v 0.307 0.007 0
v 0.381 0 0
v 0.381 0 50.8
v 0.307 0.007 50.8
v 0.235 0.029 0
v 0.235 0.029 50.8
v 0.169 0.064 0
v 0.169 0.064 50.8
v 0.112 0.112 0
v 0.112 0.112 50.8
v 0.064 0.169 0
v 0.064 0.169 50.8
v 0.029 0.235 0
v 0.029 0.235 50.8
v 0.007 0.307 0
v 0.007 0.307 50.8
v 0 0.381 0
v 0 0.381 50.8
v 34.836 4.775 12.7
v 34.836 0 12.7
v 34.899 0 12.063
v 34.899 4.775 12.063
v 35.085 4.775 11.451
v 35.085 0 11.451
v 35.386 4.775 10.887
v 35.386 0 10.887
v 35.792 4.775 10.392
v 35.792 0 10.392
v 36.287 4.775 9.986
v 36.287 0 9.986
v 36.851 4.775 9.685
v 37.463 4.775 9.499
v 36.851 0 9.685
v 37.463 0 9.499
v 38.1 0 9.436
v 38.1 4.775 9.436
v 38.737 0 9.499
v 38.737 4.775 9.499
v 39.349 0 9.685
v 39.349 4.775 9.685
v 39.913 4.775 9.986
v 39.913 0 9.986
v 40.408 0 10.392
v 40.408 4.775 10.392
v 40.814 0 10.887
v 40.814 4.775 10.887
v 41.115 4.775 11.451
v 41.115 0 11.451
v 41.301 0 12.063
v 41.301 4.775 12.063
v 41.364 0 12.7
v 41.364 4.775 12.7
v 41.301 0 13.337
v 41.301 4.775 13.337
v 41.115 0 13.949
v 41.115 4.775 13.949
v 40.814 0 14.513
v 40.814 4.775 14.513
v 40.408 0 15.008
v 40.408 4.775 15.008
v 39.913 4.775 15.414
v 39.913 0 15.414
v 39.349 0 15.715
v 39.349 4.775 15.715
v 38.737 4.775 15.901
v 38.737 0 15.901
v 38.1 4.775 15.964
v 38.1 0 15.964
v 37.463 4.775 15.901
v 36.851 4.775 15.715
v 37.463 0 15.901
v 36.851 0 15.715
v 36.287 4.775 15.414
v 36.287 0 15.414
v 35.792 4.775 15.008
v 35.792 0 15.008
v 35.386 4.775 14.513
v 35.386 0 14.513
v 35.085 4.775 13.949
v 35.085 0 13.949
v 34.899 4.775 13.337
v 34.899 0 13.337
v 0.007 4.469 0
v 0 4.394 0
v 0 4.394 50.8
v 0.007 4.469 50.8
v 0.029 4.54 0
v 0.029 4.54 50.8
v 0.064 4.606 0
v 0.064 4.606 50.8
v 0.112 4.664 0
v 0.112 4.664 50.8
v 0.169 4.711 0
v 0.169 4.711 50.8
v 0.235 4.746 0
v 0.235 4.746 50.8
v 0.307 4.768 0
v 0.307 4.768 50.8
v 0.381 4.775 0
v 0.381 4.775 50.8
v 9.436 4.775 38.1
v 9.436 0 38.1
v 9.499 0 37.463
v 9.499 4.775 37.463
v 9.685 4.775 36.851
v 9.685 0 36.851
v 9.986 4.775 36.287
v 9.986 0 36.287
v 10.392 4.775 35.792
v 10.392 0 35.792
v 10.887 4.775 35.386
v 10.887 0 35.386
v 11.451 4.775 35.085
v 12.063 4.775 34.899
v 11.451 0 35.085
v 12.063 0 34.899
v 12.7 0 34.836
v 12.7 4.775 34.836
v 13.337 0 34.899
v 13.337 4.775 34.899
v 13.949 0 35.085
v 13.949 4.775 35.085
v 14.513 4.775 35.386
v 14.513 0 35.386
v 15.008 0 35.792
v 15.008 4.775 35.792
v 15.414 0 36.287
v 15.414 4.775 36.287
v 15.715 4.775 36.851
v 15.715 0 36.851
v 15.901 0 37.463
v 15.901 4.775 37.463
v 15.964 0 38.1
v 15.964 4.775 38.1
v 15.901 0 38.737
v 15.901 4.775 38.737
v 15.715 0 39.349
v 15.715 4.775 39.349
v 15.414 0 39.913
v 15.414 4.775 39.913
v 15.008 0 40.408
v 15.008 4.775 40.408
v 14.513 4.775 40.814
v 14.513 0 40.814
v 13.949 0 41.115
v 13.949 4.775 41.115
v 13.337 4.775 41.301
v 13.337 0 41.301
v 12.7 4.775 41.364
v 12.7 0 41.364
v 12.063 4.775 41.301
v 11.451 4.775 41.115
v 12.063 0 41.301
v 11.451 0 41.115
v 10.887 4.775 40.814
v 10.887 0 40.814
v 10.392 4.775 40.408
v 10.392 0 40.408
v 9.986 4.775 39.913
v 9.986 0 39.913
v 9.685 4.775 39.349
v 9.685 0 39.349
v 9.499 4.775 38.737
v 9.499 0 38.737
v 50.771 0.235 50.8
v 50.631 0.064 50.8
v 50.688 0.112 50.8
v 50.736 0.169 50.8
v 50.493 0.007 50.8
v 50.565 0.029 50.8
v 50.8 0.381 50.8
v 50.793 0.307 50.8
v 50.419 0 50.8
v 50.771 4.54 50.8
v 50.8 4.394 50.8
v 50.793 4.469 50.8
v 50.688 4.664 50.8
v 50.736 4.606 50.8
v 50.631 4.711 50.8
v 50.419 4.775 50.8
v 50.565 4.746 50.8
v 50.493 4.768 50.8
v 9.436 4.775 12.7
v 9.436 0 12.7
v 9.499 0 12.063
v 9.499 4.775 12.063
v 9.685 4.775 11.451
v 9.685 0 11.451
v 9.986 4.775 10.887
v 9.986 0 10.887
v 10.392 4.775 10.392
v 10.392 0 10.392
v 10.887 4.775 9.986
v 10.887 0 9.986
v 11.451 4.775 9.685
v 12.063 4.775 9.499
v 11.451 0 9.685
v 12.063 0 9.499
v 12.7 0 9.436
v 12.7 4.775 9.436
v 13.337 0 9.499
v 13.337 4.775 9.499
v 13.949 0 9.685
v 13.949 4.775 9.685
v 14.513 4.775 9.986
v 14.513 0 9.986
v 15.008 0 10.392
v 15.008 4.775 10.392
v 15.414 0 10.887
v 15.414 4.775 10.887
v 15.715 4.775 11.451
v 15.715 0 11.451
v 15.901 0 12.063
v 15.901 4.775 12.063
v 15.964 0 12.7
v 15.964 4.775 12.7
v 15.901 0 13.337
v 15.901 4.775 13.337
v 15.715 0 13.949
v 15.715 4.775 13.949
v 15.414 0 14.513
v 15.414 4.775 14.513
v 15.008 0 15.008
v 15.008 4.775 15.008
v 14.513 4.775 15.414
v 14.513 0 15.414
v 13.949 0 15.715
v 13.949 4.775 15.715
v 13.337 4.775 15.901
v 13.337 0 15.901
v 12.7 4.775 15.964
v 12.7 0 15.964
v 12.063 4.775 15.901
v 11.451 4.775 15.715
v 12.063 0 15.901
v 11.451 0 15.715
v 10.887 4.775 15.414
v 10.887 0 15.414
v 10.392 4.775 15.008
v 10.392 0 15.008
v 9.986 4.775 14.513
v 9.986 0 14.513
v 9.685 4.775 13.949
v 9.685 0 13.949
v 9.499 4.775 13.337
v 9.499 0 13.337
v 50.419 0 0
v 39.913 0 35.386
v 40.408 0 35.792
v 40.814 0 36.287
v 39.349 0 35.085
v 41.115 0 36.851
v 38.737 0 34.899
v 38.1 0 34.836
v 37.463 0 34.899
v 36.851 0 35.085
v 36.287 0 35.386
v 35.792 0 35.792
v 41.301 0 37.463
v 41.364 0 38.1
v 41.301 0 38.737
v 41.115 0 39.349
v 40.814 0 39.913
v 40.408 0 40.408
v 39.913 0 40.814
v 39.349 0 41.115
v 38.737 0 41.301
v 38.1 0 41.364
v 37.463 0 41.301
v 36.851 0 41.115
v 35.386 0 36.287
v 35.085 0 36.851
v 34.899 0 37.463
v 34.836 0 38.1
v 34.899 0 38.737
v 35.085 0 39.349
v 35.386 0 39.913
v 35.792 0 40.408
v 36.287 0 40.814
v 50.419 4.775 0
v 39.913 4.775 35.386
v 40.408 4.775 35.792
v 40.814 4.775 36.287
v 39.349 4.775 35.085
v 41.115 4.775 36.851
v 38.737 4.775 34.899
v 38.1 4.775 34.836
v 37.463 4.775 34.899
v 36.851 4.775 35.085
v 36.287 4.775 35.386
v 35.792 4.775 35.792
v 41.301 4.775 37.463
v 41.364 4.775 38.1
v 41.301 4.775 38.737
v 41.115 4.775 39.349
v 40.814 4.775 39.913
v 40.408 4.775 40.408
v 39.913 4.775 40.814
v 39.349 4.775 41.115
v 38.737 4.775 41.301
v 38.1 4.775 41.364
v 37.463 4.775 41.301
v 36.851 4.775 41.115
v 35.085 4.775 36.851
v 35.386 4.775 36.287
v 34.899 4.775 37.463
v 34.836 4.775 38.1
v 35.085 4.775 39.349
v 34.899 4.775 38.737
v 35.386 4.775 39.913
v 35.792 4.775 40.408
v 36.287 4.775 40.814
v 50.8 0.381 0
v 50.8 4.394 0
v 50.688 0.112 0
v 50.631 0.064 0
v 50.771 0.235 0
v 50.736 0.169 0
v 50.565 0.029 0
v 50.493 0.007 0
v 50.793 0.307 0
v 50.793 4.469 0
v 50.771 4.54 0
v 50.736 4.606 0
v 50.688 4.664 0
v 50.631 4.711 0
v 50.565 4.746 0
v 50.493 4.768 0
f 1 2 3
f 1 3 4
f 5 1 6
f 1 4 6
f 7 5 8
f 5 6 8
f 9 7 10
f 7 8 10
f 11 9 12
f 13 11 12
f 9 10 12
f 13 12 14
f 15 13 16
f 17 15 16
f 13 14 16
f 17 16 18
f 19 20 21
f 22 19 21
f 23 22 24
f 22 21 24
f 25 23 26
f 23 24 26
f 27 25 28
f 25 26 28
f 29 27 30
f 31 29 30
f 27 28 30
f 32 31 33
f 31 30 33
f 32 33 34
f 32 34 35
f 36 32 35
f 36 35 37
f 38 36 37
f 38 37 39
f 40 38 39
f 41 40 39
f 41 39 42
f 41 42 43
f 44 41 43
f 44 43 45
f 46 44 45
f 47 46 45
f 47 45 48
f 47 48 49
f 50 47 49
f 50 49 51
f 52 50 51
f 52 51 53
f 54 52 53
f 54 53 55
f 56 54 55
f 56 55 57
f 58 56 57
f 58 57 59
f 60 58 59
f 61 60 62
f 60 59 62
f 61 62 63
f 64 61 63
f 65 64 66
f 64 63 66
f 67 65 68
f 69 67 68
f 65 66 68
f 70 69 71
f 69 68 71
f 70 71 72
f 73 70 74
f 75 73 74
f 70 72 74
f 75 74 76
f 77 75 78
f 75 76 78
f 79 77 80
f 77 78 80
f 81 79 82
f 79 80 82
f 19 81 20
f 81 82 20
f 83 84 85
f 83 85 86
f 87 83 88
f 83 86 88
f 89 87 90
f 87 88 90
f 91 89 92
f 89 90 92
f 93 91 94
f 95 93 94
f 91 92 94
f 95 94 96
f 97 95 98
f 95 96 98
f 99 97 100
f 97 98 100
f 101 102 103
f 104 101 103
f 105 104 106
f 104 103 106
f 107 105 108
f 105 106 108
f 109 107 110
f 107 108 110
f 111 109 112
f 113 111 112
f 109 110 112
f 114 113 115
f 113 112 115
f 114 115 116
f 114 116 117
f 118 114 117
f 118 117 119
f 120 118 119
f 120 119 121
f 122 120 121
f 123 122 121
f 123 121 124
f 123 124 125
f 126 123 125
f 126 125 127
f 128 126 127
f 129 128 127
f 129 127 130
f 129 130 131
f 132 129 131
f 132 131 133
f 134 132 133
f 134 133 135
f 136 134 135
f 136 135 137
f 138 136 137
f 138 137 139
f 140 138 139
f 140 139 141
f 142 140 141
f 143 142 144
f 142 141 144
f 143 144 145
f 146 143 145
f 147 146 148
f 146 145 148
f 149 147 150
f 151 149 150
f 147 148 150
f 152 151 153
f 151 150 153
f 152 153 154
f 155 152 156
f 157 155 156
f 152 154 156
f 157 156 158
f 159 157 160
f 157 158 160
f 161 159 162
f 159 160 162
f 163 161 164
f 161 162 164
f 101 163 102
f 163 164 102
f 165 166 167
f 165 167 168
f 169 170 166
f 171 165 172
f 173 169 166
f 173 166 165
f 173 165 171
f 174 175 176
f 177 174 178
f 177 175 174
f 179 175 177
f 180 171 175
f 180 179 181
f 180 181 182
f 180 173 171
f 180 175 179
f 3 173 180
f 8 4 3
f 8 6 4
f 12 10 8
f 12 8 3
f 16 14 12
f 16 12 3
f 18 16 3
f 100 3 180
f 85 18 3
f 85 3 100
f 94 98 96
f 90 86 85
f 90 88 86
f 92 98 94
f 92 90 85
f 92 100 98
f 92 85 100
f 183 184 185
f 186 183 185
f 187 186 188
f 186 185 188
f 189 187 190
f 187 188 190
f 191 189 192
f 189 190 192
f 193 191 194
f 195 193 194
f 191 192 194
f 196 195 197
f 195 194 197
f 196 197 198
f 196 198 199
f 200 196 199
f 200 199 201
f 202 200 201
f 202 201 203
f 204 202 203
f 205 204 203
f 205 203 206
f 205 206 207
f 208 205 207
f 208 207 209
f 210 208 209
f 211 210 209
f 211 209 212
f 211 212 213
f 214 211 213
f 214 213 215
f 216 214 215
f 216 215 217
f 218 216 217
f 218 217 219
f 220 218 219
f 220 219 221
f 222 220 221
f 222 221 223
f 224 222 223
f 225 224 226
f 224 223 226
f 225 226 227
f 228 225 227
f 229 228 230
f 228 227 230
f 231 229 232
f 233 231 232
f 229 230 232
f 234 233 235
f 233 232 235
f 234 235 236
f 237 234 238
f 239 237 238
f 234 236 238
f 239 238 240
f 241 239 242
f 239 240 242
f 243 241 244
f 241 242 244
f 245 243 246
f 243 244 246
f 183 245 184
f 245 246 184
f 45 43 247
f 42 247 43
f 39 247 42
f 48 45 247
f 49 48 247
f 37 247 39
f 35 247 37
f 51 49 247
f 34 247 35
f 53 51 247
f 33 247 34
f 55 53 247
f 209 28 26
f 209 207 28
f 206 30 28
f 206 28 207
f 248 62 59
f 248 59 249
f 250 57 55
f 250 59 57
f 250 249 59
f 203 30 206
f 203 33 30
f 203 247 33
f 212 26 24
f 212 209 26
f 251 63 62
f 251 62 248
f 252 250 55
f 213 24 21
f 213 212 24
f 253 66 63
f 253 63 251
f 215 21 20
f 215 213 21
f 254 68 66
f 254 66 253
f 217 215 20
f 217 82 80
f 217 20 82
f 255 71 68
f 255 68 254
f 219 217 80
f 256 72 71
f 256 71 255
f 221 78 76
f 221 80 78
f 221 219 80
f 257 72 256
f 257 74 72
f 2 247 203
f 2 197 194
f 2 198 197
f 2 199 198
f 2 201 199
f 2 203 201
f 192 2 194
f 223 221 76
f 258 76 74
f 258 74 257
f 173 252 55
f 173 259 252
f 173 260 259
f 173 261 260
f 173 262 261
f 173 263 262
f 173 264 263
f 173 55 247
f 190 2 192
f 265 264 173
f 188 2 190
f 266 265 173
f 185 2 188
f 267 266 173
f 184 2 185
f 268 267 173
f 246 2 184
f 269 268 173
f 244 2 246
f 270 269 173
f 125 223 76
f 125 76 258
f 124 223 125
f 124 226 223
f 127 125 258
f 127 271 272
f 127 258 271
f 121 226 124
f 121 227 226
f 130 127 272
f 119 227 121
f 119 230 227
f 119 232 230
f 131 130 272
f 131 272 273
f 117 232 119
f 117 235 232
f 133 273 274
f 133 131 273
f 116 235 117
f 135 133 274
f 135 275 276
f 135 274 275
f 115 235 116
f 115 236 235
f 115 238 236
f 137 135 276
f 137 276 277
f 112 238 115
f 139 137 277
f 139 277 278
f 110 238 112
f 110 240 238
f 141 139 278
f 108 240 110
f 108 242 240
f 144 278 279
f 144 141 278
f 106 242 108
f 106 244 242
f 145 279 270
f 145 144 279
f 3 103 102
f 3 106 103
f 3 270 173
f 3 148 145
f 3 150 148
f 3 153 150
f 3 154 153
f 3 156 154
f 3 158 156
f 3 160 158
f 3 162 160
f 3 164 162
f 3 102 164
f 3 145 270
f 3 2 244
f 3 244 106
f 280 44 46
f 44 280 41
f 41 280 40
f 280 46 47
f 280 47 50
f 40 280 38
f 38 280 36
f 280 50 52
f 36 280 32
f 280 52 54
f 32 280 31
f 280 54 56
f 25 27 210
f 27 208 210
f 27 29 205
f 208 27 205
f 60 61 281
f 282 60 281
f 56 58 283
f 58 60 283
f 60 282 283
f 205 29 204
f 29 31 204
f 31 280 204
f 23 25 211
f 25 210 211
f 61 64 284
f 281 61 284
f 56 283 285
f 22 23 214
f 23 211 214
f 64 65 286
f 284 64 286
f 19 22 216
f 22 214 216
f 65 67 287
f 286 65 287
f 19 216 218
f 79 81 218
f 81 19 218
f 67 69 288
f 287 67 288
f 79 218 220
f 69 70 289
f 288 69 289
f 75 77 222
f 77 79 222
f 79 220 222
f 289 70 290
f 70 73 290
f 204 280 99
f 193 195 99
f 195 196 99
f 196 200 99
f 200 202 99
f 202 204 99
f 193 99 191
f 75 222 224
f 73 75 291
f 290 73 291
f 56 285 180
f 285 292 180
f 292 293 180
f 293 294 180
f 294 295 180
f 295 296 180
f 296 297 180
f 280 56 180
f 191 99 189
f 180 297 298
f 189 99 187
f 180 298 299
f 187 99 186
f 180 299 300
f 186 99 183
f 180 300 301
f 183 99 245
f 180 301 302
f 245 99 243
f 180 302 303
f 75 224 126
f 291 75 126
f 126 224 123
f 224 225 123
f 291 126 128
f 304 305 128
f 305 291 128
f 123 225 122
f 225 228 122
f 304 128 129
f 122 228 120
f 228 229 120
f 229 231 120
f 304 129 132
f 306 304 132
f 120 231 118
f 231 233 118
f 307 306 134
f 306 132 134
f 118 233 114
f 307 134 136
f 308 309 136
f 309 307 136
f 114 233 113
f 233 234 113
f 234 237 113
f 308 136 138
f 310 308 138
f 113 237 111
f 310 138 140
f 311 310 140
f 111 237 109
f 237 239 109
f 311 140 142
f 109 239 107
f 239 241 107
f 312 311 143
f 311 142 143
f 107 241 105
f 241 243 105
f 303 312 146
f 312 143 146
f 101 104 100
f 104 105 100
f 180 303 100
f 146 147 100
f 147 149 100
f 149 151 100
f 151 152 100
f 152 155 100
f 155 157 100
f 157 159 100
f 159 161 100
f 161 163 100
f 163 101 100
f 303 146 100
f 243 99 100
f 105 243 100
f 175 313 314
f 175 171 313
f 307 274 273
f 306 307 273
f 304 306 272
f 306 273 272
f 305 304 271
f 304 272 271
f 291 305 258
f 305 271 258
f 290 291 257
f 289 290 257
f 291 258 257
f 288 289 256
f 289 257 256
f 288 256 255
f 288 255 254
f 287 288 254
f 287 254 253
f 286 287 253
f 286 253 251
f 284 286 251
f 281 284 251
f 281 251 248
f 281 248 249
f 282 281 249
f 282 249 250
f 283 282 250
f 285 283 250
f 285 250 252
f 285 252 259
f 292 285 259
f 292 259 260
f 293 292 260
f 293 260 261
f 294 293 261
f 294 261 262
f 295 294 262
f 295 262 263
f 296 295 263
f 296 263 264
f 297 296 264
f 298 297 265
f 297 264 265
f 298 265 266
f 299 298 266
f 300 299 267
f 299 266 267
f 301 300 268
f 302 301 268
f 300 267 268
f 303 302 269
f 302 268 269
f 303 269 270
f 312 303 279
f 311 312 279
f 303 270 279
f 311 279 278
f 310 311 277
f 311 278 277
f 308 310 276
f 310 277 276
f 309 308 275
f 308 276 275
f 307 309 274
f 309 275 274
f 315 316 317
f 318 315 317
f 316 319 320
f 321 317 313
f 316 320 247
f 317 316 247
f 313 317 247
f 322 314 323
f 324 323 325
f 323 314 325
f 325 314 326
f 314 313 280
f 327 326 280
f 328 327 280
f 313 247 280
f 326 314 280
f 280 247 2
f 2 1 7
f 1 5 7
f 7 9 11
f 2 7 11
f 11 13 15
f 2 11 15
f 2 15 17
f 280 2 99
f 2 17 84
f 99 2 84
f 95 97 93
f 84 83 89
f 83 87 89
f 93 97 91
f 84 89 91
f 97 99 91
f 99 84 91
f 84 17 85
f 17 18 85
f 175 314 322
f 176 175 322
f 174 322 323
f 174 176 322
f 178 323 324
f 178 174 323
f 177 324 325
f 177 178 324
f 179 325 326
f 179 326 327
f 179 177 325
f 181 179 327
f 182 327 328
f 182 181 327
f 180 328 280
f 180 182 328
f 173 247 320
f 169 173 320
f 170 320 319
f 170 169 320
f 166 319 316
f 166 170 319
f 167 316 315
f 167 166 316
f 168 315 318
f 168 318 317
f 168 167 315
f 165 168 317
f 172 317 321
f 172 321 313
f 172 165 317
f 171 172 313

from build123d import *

# Parameters (mm, degrees)
BOSS_EXTRUDE1_OUTLINE_W  = 4.7752
BOSS_EXTRUDE1_OUTLINE_H  = 50.8
BOSS_EXTRUDE1_DEPTH      = 50.8
F_0_257_DIAMETER_HOLE1_D = 6.5278
FILLET1_R                = 0.381
LPATTERN1_COUNT          = 2
LPATTERN1_PITCH          = 25.4
LPATTERN1_COUNT_DIR2     = 2
LPATTERN1_PITCH_DIR2     = 25.4


# Read off the part's stored shape, not the designer's step: Boss-Extrude1
with BuildPart() as part:
    # Boss-Extrude1 outline → Boss-Extrude1 (new body)
    with BuildSketch(Plane.YZ):
        with Locations((2.3876, 25.4)):
            Rectangle(BOSS_EXTRUDE1_OUTLINE_W, BOSS_EXTRUDE1_OUTLINE_H)
    extrude(amount=BOSS_EXTRUDE1_DEPTH)

    # F (0.257) Diameter Hole1 (through all)
    with Locations(Plane(origin=(0, 4.7752, 0), x_dir=(1, 0, 0), z_dir=(0, 1, 0))):
        with Locations((38.1, -38.1)):
            f_0_257_diameter_hole1 = Hole(F_0_257_DIAMETER_HOLE1_D / 2)

    # Fillet1
    fillet1_edges = [part.edges().sort_by_distance(p)[0] for p in [
        (50.8, 4.7752, 25.4),
        (0, 4.7752, 25.4),
        (50.8, 0, 25.4),
        (0, 0, 25.4),
    ]]
    fillet(fillet1_edges, radius=FILLET1_R)

    # LPattern1: F _0.257_ Diameter Hole1 2 × 2
    with Locations(*[(-i * LPATTERN1_PITCH, 0, -j * LPATTERN1_PITCH_DIR2) for i in range(LPATTERN1_COUNT) for j in range(LPATTERN1_COUNT_DIR2) if (i, j) != (0, 0)]):
        add(f_0_257_diameter_hole1, mode=Mode.SUBTRACT)


solid = part.part
